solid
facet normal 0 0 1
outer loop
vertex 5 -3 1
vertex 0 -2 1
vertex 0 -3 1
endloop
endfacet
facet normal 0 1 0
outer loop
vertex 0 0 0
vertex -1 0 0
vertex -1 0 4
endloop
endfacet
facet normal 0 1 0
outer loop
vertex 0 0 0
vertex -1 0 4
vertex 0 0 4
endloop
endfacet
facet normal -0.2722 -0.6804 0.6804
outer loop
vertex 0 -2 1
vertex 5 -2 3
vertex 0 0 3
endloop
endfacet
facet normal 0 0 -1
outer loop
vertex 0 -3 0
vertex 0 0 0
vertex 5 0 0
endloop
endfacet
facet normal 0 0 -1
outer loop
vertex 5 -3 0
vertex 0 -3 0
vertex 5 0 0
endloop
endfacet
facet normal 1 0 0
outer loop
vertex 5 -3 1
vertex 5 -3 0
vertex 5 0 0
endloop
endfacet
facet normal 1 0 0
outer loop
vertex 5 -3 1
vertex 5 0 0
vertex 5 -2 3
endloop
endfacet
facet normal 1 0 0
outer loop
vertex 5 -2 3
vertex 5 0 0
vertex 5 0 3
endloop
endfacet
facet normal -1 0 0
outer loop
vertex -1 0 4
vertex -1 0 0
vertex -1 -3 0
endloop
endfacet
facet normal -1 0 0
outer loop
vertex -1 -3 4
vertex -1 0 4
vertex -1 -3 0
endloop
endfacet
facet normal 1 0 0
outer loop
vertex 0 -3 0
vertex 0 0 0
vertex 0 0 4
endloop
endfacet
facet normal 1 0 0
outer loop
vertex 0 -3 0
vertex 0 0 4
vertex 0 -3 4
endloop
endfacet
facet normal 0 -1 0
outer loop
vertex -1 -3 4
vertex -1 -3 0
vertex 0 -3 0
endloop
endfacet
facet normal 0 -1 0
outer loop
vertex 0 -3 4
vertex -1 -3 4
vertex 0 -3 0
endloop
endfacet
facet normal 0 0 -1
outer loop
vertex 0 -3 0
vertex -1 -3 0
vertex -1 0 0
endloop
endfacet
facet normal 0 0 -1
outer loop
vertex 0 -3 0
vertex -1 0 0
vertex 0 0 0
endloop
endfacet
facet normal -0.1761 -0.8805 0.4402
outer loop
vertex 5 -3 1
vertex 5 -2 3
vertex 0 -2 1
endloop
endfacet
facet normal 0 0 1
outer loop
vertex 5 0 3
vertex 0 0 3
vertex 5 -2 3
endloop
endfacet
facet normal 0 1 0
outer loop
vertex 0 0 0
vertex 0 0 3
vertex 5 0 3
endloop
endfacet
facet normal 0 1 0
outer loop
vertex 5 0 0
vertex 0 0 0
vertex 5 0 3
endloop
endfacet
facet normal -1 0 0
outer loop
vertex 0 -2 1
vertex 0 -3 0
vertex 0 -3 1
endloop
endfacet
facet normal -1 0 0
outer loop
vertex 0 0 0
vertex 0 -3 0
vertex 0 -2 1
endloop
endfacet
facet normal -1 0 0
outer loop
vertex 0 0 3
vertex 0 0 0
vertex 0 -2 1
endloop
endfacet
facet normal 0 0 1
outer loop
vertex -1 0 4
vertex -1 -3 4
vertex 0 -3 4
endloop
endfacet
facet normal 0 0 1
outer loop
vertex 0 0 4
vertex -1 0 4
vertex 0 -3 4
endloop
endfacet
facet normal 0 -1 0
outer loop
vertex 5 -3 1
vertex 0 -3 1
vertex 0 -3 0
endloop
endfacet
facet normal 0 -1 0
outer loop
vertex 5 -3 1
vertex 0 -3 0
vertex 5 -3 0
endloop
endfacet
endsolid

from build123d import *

# Parameters (mm, degrees)
F0_W      = 5
F0_H      = 3
F1_DEPTH  = 3
F3_DEPTH  = 2
F5_DEPTH  = 5
F8_DEPTH  = 25
F11_DEPTH = 25
F12_W     = 1
F12_H     = 3
F13_DEPTH = 4


with BuildPart() as f1:
    # F0 (on Front) → F1 (new body)
    with BuildSketch(Plane.XZ):
        with Locations((2.5, 1.5)):
            Rectangle(F0_W, F0_H)
    extrude(amount=F1_DEPTH)

    # F2 (on face) → F3 (cut)
    with BuildSketch(Plane.XY.offset(3)):
        Polygon((0, -2), (0, -3), (5, -3), align=None)
    extrude(amount=-F3_DEPTH, mode=Mode.SUBTRACT)

    # F4 (on face) → F5 (cut)
    with BuildSketch(Plane.YZ.offset(5)):
        Polygon((-2, 3), (-3, 3), (-3, 1), align=None)
    extrude(amount=-F5_DEPTH, mode=Mode.SUBTRACT)

    # F7 (on 3pt) → F8 (cut)
    with BuildSketch(Plane(origin=(-0.3875968992, -1.9379844961, 0.9689922481), x_dir=(-0.9843740387, 0.1574998462, -0.0787499231), z_dir=(0.1760901813, 0.8804509063, -0.4402254532))):
        Polygon((-5.4731196552, -0.4472135955), (-0.3937496155, 0), (0, 0.3081578172), (-5.4731196552, 1.788854382), align=None)
    extrude(amount=-F8_DEPTH, mode=Mode.SUBTRACT)

    # F10 (on 3pt) → F11 (cut)
    with BuildSketch(Plane(origin=(-0.5555555556, -1.3888888889, 1.3888888889), x_dir=(-0.9622504486, 0.1924500897, -0.1924500897), z_dir=(0.272165527, 0.6804138174, -0.6804138174))):
        Polygon((-0.5773502692, -0.7071067812), (-0.5773502692, 2.1213203436), (-5.7735026919, 0.7071067812), align=None)
    extrude(amount=-F11_DEPTH, mode=Mode.SUBTRACT)


with BuildPart() as f13:
    # F12 (on face) → F13 (new body)
    with BuildSketch(Plane(origin=(0, 0, 0), x_dir=(1, 0, 0), z_dir=(0, 0, -1))):
        with Locations((-0.5, 1.5)):
            Rectangle(F12_W, F12_H)
    extrude(amount=-F13_DEPTH)


solid = Compound([f1.part, f13.part])
